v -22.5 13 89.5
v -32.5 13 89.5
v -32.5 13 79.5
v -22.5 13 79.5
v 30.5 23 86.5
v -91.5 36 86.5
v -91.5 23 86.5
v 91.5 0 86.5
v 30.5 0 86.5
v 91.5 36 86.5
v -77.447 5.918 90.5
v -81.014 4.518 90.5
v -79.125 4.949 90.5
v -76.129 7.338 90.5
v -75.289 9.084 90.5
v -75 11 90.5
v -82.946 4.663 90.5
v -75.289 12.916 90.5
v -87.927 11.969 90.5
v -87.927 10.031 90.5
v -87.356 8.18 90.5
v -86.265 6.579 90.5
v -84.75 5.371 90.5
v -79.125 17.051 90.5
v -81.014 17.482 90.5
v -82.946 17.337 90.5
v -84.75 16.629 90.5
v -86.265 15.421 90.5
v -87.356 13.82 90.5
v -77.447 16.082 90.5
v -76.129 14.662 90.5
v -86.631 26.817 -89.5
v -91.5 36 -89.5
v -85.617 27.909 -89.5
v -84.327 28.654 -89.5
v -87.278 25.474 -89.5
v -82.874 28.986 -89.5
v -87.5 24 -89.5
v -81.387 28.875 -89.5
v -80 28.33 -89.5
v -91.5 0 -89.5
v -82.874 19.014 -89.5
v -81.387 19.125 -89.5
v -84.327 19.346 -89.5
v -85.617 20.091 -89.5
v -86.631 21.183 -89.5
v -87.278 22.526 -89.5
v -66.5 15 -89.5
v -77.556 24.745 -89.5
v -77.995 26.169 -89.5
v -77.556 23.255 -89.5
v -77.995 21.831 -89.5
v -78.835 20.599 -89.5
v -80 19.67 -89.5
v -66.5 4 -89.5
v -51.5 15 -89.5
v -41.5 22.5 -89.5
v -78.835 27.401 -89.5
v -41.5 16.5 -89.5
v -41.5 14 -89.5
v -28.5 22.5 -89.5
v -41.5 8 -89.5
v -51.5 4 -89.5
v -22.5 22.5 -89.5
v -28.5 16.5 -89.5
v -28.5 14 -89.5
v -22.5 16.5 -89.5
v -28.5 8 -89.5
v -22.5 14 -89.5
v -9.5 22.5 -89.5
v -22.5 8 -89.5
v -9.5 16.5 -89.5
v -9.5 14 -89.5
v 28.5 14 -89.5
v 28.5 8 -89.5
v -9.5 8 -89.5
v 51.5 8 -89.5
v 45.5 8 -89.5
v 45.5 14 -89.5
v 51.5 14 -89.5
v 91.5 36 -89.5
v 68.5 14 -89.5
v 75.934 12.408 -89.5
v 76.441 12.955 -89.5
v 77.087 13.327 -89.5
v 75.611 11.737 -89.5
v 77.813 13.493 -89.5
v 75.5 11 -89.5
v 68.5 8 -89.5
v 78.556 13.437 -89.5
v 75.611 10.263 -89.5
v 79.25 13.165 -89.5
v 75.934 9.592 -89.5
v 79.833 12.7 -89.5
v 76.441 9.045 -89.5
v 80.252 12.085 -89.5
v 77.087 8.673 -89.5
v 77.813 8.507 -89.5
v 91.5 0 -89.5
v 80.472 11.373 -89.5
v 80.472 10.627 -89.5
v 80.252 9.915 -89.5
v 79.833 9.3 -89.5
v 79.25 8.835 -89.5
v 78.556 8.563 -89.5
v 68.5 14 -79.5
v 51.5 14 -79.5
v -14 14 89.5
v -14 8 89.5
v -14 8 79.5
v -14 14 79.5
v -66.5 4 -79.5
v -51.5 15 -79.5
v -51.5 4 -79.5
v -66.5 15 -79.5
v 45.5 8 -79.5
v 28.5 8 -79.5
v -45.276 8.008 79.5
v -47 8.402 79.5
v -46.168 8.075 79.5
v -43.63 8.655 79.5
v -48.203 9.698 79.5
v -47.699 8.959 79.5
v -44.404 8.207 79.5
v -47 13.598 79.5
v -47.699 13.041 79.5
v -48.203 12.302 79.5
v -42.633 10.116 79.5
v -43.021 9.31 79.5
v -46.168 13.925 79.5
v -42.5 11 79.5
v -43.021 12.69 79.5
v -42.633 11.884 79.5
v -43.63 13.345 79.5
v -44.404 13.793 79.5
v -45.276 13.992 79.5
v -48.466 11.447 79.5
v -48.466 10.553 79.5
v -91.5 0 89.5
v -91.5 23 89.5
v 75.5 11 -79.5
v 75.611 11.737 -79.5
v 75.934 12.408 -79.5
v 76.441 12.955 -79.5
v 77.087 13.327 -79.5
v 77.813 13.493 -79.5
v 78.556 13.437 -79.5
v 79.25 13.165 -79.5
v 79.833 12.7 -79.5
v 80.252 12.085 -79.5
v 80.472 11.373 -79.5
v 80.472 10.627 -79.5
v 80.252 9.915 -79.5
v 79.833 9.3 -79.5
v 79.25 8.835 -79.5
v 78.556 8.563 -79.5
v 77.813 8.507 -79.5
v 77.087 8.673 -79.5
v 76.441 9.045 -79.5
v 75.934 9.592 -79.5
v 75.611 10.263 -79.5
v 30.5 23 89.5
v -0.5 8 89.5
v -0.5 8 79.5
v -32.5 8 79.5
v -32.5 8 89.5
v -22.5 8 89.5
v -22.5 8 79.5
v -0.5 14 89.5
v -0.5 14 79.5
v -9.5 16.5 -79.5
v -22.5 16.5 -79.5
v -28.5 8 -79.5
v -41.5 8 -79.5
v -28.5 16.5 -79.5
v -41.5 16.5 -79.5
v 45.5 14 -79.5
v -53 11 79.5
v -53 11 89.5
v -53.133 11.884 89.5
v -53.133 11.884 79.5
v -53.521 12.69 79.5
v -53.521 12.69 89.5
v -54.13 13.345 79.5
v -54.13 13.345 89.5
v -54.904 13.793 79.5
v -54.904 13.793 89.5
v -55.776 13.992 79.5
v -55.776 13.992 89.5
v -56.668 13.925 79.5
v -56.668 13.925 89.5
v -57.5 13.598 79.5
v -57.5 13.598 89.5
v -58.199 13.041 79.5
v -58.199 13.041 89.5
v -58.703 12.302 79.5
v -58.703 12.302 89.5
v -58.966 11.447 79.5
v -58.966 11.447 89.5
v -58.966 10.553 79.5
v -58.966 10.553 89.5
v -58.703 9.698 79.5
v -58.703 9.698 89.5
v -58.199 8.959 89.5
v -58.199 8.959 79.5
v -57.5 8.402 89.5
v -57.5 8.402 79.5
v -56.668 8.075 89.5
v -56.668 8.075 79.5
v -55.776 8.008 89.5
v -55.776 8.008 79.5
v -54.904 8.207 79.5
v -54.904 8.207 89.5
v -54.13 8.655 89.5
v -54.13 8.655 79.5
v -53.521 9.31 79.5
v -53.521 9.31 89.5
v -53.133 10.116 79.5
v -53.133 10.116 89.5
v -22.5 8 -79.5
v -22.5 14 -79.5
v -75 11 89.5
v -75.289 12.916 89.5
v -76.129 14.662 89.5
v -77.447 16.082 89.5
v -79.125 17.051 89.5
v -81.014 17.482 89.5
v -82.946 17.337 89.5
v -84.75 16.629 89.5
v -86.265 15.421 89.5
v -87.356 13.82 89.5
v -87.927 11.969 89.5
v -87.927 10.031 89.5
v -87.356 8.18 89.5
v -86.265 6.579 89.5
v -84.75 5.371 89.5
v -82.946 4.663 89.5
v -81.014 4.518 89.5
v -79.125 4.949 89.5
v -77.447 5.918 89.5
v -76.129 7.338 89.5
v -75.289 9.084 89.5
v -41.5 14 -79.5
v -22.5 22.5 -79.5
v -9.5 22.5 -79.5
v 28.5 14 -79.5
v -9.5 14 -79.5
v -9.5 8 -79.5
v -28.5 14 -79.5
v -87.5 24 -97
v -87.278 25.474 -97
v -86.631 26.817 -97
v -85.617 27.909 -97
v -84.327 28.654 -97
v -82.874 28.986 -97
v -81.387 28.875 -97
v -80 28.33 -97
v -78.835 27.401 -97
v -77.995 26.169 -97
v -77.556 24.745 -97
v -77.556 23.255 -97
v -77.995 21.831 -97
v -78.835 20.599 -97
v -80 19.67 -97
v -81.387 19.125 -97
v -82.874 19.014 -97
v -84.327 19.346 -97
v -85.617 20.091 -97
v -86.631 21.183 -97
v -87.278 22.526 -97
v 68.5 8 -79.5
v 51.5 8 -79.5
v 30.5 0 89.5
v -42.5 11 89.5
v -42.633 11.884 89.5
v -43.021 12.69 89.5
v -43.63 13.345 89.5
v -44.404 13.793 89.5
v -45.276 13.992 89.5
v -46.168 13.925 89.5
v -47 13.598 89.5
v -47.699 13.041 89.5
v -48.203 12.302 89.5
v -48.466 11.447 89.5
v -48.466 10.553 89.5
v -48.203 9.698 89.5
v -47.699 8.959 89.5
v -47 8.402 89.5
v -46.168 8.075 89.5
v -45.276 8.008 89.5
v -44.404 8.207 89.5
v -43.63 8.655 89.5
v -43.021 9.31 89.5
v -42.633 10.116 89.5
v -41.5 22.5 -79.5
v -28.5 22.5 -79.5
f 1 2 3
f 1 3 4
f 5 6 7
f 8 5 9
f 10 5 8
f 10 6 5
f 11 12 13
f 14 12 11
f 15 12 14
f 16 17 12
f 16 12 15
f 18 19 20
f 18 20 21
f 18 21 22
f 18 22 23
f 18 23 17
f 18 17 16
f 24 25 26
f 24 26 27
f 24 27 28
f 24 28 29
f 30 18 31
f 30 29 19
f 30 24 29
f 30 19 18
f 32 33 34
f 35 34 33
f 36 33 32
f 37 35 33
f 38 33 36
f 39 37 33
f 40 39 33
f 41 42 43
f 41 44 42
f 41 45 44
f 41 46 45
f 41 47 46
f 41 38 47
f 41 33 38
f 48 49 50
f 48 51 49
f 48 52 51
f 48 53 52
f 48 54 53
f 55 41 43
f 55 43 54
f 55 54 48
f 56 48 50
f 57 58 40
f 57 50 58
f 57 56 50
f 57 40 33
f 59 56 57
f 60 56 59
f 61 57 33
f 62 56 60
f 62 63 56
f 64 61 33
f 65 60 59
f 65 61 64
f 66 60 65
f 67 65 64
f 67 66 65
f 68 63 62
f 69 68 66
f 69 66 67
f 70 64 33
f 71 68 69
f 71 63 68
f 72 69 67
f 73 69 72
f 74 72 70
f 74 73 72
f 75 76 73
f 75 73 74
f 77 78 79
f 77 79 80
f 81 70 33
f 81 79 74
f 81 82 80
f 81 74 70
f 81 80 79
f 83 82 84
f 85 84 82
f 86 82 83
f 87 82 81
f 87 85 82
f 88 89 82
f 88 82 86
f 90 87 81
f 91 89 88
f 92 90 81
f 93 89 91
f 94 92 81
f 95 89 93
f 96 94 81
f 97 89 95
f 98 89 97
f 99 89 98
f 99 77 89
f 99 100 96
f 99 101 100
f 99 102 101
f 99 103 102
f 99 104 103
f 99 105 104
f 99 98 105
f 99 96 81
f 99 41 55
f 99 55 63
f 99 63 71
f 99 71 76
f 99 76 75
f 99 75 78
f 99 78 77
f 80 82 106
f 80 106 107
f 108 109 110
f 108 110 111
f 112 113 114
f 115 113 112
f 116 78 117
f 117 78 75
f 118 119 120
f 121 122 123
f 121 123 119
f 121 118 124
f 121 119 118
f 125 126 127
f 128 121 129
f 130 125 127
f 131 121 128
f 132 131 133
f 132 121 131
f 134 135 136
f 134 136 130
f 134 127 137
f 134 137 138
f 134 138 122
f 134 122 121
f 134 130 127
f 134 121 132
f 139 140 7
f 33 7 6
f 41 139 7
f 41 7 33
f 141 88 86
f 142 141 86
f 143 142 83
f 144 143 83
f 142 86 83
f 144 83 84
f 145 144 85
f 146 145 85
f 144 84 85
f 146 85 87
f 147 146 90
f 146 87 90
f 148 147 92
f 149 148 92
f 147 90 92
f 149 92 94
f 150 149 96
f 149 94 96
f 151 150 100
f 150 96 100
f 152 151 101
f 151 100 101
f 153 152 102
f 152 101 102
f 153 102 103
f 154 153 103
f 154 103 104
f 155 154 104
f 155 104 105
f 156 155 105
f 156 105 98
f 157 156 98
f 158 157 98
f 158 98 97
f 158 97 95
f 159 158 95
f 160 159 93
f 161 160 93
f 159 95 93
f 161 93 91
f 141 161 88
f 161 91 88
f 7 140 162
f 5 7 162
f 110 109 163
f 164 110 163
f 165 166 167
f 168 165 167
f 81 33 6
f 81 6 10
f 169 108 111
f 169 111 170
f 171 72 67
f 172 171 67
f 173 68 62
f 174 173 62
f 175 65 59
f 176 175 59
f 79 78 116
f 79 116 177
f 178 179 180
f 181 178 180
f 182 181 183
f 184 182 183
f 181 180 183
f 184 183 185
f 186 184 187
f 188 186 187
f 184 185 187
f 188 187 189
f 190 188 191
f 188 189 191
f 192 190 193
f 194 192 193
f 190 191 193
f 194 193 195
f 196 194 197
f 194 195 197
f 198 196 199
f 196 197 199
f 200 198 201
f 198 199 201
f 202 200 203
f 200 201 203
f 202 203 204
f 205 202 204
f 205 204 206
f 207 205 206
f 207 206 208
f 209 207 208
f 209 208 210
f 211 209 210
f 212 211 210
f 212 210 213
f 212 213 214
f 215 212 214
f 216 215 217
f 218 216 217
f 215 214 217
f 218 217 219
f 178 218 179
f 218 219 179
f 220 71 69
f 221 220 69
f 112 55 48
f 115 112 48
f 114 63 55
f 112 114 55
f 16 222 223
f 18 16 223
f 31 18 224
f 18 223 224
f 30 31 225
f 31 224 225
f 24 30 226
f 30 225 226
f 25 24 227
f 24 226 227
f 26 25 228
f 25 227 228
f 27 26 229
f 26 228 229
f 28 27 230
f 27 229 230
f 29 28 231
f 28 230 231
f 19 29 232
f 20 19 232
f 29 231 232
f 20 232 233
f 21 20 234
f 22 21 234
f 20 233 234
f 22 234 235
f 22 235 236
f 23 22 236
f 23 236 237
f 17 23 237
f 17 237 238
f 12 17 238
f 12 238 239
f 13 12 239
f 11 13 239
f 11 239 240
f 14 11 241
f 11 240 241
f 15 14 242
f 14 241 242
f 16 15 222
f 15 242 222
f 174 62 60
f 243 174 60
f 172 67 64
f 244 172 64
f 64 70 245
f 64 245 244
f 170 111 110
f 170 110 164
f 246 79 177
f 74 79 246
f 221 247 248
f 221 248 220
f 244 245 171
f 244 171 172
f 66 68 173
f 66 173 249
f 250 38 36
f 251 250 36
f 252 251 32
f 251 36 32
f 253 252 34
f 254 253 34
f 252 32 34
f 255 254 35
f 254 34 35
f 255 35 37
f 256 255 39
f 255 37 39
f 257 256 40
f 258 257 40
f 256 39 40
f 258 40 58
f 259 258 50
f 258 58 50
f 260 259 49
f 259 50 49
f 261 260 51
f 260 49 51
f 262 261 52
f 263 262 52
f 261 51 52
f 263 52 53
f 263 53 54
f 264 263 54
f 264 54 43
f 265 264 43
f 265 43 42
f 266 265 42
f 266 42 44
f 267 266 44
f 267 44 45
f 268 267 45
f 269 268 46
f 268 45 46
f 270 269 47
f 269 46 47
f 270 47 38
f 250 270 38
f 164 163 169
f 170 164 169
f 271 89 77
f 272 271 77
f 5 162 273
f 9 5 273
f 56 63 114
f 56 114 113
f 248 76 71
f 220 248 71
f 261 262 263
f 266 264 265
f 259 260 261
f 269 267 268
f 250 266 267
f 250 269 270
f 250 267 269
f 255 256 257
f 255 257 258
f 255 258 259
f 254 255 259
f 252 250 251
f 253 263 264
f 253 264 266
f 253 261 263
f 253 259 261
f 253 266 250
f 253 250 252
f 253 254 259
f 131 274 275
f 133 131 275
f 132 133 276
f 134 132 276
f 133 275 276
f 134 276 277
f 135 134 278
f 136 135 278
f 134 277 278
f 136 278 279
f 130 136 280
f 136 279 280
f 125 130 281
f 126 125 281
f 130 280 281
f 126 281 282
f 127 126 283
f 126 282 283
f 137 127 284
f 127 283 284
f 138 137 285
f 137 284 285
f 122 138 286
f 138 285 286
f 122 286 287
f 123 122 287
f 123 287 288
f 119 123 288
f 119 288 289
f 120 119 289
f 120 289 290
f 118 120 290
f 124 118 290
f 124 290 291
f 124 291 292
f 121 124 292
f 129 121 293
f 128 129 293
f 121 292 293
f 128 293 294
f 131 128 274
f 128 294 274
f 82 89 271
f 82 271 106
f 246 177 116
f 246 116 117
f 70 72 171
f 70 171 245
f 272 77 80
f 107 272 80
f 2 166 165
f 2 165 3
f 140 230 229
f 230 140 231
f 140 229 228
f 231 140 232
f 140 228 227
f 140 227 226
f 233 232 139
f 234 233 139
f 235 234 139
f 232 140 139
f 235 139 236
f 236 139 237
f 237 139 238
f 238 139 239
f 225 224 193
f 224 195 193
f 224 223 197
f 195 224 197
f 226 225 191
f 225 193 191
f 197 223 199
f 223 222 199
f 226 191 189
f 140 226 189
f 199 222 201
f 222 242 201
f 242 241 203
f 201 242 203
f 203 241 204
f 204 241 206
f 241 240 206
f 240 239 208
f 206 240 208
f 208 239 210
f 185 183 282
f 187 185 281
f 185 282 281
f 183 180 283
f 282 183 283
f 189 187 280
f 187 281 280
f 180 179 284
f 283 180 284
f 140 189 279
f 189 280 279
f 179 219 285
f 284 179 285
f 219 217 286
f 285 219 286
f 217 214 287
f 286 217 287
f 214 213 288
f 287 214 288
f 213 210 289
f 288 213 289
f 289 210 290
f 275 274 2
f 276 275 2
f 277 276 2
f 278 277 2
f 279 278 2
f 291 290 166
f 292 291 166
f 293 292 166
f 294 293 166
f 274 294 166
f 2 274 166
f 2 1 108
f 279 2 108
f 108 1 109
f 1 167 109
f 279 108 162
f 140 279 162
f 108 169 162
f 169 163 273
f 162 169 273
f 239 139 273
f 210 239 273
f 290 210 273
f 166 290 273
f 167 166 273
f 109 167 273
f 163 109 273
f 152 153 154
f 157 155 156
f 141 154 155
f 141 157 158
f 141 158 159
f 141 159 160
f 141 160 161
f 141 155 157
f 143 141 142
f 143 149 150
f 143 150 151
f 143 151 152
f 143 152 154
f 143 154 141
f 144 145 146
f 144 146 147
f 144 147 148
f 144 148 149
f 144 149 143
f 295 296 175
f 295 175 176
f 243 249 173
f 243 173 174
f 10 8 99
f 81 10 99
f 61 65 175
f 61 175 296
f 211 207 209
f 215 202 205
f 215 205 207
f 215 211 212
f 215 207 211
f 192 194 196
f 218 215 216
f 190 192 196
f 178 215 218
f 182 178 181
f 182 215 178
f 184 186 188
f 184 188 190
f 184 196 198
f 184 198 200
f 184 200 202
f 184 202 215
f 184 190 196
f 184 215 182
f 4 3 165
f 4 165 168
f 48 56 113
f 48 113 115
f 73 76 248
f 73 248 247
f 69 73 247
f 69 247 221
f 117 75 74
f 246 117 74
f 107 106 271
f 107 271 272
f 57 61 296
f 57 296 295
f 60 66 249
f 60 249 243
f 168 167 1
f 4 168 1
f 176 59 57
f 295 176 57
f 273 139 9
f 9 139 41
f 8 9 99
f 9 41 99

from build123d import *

# Parameters (mm, degrees)
SKETCH_1_W          = 183
SKETCH_1_H          = 179
EXTRUDE_1_DEPTH     = 36
CUT_EXTRUDE_1_DEPTH = 3
SKETCH_3_R          = 3
SKETCH_3_W          = 10
SKETCH_3_H          = 5
SKETCH_3_W_2        = 13.5
SKETCH_3_H_2        = 6
CUT_EXTRUDE_2_DEPTH = 10
SKETCH_4_R          = 6.5
EXTRUDE_2_DEPTH     = 1
SKETCH_5_R          = 2.5
SKETCH_5_W          = 17
SKETCH_5_H          = 6
SKETCH_5_W_2        = 13
SKETCH_5_W_3        = 15
SKETCH_5_H_2        = 11
CUT_EXTRUDE_3_DEPTH = 10
SKETCH_6_R          = 5
EXTRUDE_3_DEPTH     = 7.5


with BuildPart() as part:
    # 草图1 → 凸台-拉伸1 (new body)
    with BuildSketch(Plane(origin=(0, 0, 0), x_dir=(1, 0, 0), z_dir=(0, 1, 0))):
        Rectangle(SKETCH_1_W, SKETCH_1_H)
    extrude(amount=EXTRUDE_1_DEPTH)

    # 草图2 → 切除-拉伸1 (cut)
    with BuildSketch(Plane.XY.offset(89.5)):
        Polygon((-91.5, 36), (-91.5, 23), (30.5, 23), (30.5, 0), (91.5, 0), (91.5, 36), align=None)
    extrude(amount=-CUT_EXTRUDE_1_DEPTH, mode=Mode.SUBTRACT)

    # 草图3 → 切除-拉伸2 (cut)
    with BuildSketch(Plane.XY.offset(89.5)):
        with Locations((-56, 11)):
            Circle(SKETCH_3_R)
        with Locations((-45.5, 11)):
            Circle(SKETCH_3_R)
        with Locations((-27.5, 10.5)):
            Rectangle(SKETCH_3_W, SKETCH_3_H)
        with Locations((-7.25, 11)):
            Rectangle(SKETCH_3_W_2, SKETCH_3_H_2)
    extrude(amount=-CUT_EXTRUDE_2_DEPTH, mode=Mode.SUBTRACT)

    # 草图4 → 凸台-拉伸2 (add)
    with BuildSketch(Plane.XY.offset(89.5)):
        with Locations((-81.5, 11)):
            Circle(SKETCH_4_R)
    extrude(amount=EXTRUDE_2_DEPTH)

    # 草图5 → 切除-拉伸3 (cut)
    with BuildSketch(Plane(origin=(0, 0, -89.5), x_dir=(-1, 0, 0), z_dir=(0, 0, -1))):
        with Locations((-78, 11)):
            Circle(SKETCH_5_R)
        with Locations((-60, 11)):
            Rectangle(SKETCH_5_W, SKETCH_5_H)
        with Locations((-37, 11)):
            Rectangle(SKETCH_5_W, SKETCH_5_H)
        with Locations((16, 19.5)):
            Rectangle(SKETCH_5_W_2, SKETCH_5_H)
        with Locations((35, 19.5)):
            Rectangle(SKETCH_5_W_2, SKETCH_5_H)
        with Locations((16, 11)):
            Rectangle(SKETCH_5_W_2, SKETCH_5_H)
        with Locations((35, 11)):
            Rectangle(SKETCH_5_W_2, SKETCH_5_H)
        with Locations((59, 9.5)):
            Rectangle(SKETCH_5_W_3, SKETCH_5_H_2)
    extrude(amount=-CUT_EXTRUDE_3_DEPTH, mode=Mode.SUBTRACT)

    # 草图6 → 凸台-拉伸3 (add)
    with BuildSketch(Plane(origin=(0, 0, -89.5), x_dir=(-1, 0, 0), z_dir=(0, 0, -1))):
        with Locations((82.5, 24)):
            Circle(SKETCH_6_R)
    extrude(amount=EXTRUDE_3_DEPTH)


solid = part.part
